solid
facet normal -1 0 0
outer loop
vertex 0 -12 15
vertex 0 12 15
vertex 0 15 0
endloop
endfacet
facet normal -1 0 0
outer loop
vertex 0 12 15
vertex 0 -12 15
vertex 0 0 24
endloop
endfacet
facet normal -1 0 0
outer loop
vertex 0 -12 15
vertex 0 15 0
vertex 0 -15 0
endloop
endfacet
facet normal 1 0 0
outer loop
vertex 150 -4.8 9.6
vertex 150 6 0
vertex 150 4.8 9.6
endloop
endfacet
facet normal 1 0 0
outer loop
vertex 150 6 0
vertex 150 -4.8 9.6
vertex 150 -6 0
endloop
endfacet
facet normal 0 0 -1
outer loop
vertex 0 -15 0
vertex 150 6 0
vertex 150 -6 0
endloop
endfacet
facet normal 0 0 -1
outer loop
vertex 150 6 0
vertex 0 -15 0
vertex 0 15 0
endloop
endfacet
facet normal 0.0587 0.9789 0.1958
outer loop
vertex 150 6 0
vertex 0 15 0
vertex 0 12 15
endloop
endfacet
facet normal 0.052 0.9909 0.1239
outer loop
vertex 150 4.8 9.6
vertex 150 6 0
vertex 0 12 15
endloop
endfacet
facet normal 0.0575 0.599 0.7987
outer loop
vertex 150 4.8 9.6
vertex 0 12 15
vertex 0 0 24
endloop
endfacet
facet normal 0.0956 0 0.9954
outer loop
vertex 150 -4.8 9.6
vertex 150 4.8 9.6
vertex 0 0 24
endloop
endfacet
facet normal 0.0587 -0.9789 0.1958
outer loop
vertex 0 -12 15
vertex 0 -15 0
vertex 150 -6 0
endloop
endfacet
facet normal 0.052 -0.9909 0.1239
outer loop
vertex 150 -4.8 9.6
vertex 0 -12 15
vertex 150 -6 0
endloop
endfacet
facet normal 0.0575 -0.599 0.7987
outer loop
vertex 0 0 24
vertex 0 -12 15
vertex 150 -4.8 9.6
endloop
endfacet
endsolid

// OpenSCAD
include <MCAD/units.scad>

use <MCAD/unregular_shapes.scad>

beak_size = 3*cm;
beak_lenght = 15*cm;
beak_tip_scale = 0.4;
beak_tip_size = beak_tip_scale*beak_size;

module beak(){
    for (i = [1, -1]){ // Mirroring
        connect_squares([[0, 0, 0], [0, i*beak_size/2, 0], // Base
                         [0, i*.8*beak_size/2, .5*beak_size],
                         [0, 0, .8*beak_size],
                         [beak_lenght, 0, 0], // Tip
                         [beak_lenght, i*beak_tip_size/2, 0],
                         [beak_lenght, i*.8*beak_tip_size/2, .8*beak_tip_size],
                         [beak_lenght, 0, .8*beak_tip_size]]);
    }
}

module assembly(){
    beak();
}

assembly();
